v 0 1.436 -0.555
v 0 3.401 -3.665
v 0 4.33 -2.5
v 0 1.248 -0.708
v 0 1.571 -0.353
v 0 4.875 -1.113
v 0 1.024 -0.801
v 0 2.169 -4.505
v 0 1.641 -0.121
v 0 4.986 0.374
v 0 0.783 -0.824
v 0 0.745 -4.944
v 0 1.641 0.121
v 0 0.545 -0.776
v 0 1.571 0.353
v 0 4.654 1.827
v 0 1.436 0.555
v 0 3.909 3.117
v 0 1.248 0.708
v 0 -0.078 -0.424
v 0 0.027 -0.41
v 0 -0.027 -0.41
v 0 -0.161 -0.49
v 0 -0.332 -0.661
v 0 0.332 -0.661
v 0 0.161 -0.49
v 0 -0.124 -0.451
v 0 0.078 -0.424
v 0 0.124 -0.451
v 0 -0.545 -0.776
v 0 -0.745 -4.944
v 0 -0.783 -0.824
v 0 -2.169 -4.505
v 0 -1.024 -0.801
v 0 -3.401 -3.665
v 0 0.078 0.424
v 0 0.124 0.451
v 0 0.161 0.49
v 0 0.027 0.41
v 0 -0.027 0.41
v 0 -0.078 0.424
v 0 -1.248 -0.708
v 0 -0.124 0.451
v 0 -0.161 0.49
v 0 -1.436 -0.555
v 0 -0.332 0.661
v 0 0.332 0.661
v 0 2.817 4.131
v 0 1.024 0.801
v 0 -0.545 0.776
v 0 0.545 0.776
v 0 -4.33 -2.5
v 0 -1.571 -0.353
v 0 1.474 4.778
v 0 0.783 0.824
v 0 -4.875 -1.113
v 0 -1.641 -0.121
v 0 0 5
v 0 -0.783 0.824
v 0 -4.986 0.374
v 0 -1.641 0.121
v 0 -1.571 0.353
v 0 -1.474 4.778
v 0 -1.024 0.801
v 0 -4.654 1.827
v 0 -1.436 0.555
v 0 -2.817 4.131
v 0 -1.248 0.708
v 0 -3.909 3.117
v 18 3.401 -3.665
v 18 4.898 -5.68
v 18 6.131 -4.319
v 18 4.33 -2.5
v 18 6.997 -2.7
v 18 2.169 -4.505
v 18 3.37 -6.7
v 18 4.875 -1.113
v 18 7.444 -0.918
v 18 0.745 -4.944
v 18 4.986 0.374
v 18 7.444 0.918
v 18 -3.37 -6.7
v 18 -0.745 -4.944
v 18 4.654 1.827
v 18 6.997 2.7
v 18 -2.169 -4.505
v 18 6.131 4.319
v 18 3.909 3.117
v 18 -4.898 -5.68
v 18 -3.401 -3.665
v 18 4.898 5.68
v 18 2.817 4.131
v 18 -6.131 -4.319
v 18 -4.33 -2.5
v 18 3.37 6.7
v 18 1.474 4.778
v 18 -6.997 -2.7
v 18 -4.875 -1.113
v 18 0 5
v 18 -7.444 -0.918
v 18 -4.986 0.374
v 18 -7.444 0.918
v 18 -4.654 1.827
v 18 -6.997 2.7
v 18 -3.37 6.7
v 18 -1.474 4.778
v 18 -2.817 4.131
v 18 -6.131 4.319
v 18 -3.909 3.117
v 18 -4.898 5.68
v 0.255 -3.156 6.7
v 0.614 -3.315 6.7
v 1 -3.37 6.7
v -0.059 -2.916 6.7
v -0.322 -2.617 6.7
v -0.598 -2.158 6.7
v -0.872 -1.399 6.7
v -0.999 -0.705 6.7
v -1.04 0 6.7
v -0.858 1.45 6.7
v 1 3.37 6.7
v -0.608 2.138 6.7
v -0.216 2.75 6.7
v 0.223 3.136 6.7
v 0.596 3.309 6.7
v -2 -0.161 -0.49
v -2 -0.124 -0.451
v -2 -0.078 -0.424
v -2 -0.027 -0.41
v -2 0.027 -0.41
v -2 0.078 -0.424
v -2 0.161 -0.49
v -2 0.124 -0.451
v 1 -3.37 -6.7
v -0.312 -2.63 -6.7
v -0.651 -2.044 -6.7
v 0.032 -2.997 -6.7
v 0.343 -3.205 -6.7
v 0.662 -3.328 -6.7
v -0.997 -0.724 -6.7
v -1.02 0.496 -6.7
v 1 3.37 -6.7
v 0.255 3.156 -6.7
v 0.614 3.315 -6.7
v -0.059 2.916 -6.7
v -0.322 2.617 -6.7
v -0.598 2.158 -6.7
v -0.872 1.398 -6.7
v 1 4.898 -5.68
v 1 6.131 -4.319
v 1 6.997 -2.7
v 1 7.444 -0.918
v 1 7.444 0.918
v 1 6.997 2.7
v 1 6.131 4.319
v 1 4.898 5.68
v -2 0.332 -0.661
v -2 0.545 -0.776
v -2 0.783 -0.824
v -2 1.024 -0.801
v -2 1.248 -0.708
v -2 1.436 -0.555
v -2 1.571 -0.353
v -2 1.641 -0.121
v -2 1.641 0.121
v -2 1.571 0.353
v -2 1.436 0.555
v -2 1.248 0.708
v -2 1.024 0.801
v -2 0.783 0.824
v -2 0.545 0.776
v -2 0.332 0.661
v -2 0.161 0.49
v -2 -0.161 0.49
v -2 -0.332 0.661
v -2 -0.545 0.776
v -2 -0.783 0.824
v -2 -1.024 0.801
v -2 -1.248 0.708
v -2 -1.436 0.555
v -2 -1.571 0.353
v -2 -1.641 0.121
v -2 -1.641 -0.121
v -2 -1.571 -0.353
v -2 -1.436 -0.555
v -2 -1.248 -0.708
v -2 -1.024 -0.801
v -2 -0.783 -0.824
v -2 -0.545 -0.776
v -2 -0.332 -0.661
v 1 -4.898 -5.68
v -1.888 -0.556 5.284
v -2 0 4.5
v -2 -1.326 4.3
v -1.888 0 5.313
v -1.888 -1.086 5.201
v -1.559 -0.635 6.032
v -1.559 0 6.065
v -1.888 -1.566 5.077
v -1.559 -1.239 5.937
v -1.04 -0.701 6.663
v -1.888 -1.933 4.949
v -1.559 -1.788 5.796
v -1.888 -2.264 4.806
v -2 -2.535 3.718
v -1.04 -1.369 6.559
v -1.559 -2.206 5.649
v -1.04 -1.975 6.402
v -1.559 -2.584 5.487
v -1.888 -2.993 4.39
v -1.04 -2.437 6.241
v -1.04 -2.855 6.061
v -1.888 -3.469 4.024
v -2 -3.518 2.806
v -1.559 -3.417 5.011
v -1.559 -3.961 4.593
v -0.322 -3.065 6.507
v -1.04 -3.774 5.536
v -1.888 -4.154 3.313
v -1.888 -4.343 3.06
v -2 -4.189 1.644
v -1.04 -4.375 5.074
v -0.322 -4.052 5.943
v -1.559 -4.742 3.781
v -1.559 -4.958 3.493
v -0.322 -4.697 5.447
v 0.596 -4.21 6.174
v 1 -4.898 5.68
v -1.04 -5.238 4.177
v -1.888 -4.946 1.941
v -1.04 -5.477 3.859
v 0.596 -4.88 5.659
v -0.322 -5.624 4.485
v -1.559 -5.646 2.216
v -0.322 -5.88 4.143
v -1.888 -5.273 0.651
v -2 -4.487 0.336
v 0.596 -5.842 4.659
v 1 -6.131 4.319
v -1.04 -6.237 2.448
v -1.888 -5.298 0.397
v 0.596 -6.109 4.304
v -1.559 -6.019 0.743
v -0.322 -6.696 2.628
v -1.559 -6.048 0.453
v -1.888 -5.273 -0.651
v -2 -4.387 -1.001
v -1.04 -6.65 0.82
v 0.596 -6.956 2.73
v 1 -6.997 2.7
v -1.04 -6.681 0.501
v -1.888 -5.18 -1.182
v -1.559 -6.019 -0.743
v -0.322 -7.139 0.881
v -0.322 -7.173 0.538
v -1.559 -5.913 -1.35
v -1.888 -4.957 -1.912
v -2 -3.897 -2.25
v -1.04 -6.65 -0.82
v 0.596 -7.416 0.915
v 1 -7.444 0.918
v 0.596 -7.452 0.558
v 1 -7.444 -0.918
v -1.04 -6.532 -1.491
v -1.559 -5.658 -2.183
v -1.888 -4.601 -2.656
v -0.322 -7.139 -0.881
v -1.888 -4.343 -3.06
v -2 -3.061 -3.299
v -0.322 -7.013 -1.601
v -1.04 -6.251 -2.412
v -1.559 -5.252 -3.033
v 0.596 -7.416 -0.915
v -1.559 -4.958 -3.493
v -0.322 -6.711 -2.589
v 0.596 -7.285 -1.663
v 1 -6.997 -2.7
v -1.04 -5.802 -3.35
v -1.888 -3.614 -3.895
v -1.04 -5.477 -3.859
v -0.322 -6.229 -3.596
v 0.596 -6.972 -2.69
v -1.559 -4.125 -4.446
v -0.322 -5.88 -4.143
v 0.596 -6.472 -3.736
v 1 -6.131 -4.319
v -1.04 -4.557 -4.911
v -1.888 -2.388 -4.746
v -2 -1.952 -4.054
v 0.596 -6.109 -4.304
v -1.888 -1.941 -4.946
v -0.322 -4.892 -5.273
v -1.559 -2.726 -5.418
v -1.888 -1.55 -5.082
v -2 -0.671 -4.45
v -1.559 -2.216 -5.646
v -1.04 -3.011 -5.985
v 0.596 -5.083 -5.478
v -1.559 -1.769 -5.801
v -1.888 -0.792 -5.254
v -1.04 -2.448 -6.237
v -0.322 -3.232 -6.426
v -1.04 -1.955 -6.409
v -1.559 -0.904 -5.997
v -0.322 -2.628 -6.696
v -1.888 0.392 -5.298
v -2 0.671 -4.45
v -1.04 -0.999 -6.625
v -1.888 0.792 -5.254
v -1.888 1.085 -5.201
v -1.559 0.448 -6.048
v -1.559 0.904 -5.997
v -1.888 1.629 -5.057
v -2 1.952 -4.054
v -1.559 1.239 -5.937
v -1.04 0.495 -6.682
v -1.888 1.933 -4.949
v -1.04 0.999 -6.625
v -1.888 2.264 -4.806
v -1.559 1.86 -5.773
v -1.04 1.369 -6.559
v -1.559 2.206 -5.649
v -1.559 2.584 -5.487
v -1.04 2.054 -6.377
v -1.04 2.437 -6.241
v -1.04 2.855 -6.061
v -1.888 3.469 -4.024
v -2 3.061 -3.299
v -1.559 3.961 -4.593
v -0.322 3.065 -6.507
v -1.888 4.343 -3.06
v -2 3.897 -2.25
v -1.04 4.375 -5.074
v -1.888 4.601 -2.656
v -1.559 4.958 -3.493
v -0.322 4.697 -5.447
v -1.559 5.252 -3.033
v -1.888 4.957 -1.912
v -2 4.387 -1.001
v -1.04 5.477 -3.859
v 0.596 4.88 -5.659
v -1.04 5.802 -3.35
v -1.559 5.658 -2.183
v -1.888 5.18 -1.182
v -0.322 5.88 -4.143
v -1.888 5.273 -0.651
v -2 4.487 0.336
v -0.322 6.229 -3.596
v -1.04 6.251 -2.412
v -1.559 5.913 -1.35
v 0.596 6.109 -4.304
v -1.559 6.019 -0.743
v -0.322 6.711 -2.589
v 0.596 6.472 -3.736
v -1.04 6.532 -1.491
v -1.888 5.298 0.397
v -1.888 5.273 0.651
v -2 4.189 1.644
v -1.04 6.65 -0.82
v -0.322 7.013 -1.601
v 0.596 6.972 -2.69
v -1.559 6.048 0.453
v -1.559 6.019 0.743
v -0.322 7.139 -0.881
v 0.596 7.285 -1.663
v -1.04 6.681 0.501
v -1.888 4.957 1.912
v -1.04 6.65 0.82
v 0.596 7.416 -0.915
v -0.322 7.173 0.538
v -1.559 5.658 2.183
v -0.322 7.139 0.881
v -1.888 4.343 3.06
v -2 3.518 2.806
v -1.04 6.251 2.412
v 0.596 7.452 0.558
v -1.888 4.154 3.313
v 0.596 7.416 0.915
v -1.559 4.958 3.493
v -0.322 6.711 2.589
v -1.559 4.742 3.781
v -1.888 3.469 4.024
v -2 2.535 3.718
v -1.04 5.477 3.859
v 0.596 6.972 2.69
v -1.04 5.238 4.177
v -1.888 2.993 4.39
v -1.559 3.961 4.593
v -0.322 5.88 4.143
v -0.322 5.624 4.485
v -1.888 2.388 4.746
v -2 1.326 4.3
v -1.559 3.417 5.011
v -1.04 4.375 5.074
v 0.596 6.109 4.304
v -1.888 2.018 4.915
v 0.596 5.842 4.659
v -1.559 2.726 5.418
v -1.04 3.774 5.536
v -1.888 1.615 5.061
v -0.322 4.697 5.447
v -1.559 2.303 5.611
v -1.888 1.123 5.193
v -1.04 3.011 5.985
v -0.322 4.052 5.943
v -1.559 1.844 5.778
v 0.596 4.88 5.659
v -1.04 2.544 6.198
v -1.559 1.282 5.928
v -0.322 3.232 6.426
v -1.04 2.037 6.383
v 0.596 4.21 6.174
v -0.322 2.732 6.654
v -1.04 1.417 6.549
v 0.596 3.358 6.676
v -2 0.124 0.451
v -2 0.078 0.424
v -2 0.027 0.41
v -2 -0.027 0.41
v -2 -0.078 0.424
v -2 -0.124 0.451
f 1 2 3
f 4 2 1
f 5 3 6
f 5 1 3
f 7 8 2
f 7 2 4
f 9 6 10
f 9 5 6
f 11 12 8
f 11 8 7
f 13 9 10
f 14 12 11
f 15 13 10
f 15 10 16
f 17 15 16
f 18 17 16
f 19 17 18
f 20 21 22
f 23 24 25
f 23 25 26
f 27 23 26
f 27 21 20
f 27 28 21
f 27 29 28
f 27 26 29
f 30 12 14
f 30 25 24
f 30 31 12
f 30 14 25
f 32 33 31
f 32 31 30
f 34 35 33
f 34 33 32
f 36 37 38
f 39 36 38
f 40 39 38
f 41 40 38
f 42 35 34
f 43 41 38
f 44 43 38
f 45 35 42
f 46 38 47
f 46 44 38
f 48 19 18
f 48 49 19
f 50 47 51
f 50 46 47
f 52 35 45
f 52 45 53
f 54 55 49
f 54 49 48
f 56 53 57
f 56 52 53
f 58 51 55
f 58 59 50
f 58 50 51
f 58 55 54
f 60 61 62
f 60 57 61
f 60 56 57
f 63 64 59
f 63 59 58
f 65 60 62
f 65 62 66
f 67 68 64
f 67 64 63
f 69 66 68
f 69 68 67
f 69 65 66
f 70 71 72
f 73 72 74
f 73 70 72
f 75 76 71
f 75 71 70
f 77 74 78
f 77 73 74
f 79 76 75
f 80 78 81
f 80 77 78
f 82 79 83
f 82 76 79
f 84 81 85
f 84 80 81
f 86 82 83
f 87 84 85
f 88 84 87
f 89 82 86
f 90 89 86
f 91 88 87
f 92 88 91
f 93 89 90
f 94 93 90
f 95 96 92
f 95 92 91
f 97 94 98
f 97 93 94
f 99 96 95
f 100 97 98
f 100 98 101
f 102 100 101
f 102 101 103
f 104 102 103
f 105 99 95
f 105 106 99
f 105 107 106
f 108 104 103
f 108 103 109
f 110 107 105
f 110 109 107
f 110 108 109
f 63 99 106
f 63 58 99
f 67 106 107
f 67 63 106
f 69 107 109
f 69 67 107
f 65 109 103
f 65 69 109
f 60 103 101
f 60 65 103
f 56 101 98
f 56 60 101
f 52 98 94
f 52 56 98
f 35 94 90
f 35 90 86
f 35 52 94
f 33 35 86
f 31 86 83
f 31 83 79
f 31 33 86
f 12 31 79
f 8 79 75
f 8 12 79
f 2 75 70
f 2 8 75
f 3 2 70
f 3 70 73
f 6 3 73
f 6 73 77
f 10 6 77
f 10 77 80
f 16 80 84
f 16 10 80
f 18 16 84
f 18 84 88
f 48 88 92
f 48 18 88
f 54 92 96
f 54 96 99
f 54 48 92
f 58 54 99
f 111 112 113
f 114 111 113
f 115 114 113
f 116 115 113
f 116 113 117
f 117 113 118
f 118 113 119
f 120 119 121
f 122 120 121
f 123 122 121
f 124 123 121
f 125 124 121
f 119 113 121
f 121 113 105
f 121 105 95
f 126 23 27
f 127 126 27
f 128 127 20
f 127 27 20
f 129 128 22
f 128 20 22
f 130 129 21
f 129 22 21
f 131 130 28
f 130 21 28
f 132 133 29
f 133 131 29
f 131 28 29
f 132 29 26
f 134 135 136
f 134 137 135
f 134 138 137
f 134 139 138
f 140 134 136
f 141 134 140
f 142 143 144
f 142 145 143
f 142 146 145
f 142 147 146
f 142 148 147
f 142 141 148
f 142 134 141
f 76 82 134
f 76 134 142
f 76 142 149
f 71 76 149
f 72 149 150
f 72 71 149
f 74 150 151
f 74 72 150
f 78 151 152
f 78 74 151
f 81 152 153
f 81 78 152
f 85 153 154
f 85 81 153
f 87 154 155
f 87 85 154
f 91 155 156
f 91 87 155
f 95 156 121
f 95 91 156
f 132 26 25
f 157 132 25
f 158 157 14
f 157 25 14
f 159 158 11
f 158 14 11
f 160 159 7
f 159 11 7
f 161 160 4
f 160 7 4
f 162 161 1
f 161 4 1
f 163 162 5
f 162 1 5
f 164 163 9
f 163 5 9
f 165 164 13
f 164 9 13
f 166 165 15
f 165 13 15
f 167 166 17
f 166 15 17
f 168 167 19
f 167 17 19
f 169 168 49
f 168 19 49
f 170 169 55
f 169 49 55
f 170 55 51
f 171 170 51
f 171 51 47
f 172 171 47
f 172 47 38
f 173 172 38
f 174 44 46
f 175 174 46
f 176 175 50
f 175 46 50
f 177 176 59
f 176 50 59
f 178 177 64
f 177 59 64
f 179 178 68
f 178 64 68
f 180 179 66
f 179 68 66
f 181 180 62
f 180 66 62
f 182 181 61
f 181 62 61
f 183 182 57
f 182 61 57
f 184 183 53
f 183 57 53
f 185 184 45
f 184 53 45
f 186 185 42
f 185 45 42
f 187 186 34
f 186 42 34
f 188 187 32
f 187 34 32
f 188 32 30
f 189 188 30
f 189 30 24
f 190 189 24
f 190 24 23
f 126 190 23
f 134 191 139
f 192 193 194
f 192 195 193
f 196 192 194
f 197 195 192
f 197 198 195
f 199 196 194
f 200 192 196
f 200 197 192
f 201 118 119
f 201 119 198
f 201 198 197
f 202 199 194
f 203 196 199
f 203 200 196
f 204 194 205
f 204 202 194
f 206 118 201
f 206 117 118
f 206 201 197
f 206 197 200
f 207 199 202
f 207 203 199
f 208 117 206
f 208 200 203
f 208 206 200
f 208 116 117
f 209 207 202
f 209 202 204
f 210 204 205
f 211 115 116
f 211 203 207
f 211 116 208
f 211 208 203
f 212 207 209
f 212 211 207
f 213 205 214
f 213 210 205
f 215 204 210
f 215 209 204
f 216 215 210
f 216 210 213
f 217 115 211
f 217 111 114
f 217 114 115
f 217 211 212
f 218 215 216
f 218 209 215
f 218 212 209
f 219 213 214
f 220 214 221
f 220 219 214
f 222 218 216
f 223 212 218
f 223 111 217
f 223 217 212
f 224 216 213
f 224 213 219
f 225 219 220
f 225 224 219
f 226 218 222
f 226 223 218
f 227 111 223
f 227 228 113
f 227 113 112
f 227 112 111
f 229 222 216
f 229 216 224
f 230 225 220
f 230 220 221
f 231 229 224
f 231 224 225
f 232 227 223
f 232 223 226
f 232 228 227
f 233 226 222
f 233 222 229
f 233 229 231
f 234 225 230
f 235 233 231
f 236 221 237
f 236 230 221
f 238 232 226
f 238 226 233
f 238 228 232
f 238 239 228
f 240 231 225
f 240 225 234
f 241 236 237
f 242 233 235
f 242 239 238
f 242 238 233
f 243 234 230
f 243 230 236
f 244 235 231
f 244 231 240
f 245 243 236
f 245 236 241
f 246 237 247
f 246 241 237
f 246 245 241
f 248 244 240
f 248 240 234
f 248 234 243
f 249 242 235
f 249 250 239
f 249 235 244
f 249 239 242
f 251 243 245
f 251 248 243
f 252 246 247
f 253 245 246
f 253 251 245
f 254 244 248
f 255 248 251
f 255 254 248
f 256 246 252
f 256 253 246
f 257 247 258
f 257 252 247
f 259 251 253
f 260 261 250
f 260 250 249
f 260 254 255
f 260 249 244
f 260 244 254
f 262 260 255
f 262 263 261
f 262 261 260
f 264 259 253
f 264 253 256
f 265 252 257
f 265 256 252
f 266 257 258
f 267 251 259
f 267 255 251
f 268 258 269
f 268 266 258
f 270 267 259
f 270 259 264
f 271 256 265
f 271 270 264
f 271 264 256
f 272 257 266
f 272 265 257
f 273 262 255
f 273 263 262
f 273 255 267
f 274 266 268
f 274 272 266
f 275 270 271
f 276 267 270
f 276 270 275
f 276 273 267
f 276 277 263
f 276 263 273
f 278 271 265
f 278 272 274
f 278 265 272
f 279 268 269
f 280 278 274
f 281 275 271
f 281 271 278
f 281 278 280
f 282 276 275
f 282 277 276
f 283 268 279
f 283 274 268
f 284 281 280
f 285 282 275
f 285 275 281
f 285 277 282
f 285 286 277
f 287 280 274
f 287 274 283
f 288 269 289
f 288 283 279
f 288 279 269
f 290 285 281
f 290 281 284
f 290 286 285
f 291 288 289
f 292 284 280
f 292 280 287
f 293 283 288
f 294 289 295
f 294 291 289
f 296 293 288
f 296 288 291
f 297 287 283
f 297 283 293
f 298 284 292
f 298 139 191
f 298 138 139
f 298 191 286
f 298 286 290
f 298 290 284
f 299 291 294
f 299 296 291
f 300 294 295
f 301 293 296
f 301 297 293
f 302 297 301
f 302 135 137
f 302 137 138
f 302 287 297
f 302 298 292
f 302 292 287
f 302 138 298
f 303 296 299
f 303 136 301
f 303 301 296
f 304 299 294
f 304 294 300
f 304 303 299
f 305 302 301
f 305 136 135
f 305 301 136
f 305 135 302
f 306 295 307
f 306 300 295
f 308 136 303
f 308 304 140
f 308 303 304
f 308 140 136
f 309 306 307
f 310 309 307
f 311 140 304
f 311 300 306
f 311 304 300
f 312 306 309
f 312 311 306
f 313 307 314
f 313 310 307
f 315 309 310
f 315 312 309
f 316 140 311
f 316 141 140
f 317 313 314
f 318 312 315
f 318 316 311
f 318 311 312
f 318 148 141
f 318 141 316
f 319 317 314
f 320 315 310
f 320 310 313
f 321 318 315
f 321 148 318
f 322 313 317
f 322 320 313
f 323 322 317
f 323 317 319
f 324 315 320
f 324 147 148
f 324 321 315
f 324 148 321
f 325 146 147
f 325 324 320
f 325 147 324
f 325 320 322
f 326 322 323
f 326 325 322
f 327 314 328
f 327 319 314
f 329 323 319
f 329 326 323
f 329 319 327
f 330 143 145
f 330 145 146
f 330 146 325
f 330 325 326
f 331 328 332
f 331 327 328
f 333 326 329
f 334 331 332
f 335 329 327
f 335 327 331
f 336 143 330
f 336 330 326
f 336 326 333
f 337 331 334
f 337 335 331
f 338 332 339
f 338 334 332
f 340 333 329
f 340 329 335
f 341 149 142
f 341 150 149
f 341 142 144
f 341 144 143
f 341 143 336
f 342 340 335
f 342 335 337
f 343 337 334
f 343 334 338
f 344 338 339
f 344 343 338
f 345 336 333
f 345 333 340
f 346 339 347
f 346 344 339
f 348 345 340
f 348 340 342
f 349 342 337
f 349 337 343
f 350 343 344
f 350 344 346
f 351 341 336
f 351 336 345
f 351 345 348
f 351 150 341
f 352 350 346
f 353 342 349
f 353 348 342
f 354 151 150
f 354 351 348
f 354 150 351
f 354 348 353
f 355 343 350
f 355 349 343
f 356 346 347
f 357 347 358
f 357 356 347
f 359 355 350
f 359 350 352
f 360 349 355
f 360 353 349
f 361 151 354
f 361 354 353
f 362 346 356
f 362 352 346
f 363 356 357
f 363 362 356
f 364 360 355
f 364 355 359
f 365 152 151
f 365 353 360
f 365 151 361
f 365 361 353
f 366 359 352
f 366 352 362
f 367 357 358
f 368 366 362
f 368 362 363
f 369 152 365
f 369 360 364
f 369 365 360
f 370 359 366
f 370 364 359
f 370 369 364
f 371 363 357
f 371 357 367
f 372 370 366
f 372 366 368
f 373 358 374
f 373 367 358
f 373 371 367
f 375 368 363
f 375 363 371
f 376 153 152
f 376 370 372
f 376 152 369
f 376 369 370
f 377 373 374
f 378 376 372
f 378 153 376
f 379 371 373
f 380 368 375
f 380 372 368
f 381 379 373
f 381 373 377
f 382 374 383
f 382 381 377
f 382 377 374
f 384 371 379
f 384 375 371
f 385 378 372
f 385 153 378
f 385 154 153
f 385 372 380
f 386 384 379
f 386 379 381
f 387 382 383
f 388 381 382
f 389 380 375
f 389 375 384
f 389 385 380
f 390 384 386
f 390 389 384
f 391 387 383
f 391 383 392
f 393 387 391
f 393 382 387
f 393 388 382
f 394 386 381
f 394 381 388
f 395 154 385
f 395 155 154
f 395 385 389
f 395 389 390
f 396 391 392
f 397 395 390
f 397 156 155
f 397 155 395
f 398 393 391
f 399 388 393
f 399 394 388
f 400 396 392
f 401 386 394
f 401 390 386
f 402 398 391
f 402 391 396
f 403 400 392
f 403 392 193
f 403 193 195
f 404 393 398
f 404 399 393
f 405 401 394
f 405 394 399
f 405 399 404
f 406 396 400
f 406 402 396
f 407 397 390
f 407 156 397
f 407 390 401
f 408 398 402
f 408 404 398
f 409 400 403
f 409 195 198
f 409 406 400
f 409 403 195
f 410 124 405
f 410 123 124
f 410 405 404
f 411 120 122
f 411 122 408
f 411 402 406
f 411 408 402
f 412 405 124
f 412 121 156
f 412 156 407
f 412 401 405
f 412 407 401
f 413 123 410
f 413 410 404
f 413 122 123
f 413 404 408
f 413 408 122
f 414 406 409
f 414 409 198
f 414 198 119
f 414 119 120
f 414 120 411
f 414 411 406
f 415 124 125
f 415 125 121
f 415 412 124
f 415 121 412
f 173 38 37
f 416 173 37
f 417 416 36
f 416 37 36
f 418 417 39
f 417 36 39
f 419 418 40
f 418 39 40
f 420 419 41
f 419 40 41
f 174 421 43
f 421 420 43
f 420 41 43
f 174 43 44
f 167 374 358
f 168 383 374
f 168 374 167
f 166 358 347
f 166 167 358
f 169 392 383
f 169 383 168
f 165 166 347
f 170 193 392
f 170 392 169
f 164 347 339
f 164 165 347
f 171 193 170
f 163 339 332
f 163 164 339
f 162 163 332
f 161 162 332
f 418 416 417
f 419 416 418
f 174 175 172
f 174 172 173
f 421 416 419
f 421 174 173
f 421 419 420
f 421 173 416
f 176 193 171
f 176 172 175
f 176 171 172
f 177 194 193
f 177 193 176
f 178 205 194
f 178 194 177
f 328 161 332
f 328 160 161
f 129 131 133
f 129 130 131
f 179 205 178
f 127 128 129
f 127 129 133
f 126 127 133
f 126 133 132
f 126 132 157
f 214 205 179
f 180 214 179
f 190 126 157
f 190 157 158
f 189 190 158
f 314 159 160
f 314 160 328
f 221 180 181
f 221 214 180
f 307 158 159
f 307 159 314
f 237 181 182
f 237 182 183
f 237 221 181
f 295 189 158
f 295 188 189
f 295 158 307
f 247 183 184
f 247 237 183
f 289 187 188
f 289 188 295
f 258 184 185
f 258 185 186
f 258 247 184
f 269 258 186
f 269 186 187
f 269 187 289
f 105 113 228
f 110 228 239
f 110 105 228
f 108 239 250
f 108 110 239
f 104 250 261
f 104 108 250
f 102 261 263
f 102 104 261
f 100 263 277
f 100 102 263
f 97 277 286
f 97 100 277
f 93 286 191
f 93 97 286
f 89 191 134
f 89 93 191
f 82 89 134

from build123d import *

# Parameters (mm, degrees)
FILLET1_R          = 3
SKETCH2_W          = 17.193533638
SKETCH2_H          = 22.71470374
SKETCH2_W_2        = 13.4
SKETCH2_H_2        = 17.458798434
CUT_EXTRUDE1_DEPTH = 23.638462845
CUT_EXTRUDE3_DEPTH = 21.618923503


with BuildPart() as part:
    # Sketch1 → Revolve1 (revolve)
    with BuildSketch(Plane.XY, mode=Mode.PRIVATE) as revolve1_sk:
        Polygon((18, 7.5), (18, 5), (0, 5), (0, 0), (-2, 0), (-2, 7.5), align=None)
    revolve(revolve1_sk.sketch.rotate(Axis((-2, 0, 0), (1, 0, 0)), 90), axis=Axis((-2, 0, 0), (1, 0, 0)))

    # Fillet1
    fillet1_edges = [part.edges().sort_by_distance(p)[0] for p in [
        (-2, 0, -7.5),
    ]]
    fillet(fillet1_edges, radius=FILLET1_R)

    # Sketch2 → Cut-Extrude1 (cut, through all)
    with BuildSketch(Plane(origin=(18, 0, 0), x_dir=(0, 0, -1), z_dir=(1, 0, 0))):
        Rectangle(SKETCH2_W, SKETCH2_H)
        Rectangle(SKETCH2_W_2, SKETCH2_H_2, mode=Mode.SUBTRACT)
    extrude(amount=-CUT_EXTRUDE1_DEPTH, mode=Mode.SUBTRACT)

    # Sketch3 → Cut-Extrude3 (cut, through all)
    with BuildSketch(Plane(origin=(0, 0, 0), x_dir=(0, 0, -1), z_dir=(1, 0, 0))):
        with BuildLine():
            ThreePointArc((0.489588204, 0.16097561), (0, 1.65), (-0.489588204, 0.16097561))
            ThreePointArc((-0.489588204, 0.16097561), (-0.408276253, 0), (-0.489588204, -0.16097561))
            ThreePointArc((-0.489588204, -0.16097561), (0, -1.65), (0.489588204, -0.16097561))
            ThreePointArc((0.489588204, -0.16097561), (0.408276253, 0), (0.489588204, 0.16097561))
        make_face()
    extrude(amount=-CUT_EXTRUDE3_DEPTH, mode=Mode.SUBTRACT)


solid = part.part
